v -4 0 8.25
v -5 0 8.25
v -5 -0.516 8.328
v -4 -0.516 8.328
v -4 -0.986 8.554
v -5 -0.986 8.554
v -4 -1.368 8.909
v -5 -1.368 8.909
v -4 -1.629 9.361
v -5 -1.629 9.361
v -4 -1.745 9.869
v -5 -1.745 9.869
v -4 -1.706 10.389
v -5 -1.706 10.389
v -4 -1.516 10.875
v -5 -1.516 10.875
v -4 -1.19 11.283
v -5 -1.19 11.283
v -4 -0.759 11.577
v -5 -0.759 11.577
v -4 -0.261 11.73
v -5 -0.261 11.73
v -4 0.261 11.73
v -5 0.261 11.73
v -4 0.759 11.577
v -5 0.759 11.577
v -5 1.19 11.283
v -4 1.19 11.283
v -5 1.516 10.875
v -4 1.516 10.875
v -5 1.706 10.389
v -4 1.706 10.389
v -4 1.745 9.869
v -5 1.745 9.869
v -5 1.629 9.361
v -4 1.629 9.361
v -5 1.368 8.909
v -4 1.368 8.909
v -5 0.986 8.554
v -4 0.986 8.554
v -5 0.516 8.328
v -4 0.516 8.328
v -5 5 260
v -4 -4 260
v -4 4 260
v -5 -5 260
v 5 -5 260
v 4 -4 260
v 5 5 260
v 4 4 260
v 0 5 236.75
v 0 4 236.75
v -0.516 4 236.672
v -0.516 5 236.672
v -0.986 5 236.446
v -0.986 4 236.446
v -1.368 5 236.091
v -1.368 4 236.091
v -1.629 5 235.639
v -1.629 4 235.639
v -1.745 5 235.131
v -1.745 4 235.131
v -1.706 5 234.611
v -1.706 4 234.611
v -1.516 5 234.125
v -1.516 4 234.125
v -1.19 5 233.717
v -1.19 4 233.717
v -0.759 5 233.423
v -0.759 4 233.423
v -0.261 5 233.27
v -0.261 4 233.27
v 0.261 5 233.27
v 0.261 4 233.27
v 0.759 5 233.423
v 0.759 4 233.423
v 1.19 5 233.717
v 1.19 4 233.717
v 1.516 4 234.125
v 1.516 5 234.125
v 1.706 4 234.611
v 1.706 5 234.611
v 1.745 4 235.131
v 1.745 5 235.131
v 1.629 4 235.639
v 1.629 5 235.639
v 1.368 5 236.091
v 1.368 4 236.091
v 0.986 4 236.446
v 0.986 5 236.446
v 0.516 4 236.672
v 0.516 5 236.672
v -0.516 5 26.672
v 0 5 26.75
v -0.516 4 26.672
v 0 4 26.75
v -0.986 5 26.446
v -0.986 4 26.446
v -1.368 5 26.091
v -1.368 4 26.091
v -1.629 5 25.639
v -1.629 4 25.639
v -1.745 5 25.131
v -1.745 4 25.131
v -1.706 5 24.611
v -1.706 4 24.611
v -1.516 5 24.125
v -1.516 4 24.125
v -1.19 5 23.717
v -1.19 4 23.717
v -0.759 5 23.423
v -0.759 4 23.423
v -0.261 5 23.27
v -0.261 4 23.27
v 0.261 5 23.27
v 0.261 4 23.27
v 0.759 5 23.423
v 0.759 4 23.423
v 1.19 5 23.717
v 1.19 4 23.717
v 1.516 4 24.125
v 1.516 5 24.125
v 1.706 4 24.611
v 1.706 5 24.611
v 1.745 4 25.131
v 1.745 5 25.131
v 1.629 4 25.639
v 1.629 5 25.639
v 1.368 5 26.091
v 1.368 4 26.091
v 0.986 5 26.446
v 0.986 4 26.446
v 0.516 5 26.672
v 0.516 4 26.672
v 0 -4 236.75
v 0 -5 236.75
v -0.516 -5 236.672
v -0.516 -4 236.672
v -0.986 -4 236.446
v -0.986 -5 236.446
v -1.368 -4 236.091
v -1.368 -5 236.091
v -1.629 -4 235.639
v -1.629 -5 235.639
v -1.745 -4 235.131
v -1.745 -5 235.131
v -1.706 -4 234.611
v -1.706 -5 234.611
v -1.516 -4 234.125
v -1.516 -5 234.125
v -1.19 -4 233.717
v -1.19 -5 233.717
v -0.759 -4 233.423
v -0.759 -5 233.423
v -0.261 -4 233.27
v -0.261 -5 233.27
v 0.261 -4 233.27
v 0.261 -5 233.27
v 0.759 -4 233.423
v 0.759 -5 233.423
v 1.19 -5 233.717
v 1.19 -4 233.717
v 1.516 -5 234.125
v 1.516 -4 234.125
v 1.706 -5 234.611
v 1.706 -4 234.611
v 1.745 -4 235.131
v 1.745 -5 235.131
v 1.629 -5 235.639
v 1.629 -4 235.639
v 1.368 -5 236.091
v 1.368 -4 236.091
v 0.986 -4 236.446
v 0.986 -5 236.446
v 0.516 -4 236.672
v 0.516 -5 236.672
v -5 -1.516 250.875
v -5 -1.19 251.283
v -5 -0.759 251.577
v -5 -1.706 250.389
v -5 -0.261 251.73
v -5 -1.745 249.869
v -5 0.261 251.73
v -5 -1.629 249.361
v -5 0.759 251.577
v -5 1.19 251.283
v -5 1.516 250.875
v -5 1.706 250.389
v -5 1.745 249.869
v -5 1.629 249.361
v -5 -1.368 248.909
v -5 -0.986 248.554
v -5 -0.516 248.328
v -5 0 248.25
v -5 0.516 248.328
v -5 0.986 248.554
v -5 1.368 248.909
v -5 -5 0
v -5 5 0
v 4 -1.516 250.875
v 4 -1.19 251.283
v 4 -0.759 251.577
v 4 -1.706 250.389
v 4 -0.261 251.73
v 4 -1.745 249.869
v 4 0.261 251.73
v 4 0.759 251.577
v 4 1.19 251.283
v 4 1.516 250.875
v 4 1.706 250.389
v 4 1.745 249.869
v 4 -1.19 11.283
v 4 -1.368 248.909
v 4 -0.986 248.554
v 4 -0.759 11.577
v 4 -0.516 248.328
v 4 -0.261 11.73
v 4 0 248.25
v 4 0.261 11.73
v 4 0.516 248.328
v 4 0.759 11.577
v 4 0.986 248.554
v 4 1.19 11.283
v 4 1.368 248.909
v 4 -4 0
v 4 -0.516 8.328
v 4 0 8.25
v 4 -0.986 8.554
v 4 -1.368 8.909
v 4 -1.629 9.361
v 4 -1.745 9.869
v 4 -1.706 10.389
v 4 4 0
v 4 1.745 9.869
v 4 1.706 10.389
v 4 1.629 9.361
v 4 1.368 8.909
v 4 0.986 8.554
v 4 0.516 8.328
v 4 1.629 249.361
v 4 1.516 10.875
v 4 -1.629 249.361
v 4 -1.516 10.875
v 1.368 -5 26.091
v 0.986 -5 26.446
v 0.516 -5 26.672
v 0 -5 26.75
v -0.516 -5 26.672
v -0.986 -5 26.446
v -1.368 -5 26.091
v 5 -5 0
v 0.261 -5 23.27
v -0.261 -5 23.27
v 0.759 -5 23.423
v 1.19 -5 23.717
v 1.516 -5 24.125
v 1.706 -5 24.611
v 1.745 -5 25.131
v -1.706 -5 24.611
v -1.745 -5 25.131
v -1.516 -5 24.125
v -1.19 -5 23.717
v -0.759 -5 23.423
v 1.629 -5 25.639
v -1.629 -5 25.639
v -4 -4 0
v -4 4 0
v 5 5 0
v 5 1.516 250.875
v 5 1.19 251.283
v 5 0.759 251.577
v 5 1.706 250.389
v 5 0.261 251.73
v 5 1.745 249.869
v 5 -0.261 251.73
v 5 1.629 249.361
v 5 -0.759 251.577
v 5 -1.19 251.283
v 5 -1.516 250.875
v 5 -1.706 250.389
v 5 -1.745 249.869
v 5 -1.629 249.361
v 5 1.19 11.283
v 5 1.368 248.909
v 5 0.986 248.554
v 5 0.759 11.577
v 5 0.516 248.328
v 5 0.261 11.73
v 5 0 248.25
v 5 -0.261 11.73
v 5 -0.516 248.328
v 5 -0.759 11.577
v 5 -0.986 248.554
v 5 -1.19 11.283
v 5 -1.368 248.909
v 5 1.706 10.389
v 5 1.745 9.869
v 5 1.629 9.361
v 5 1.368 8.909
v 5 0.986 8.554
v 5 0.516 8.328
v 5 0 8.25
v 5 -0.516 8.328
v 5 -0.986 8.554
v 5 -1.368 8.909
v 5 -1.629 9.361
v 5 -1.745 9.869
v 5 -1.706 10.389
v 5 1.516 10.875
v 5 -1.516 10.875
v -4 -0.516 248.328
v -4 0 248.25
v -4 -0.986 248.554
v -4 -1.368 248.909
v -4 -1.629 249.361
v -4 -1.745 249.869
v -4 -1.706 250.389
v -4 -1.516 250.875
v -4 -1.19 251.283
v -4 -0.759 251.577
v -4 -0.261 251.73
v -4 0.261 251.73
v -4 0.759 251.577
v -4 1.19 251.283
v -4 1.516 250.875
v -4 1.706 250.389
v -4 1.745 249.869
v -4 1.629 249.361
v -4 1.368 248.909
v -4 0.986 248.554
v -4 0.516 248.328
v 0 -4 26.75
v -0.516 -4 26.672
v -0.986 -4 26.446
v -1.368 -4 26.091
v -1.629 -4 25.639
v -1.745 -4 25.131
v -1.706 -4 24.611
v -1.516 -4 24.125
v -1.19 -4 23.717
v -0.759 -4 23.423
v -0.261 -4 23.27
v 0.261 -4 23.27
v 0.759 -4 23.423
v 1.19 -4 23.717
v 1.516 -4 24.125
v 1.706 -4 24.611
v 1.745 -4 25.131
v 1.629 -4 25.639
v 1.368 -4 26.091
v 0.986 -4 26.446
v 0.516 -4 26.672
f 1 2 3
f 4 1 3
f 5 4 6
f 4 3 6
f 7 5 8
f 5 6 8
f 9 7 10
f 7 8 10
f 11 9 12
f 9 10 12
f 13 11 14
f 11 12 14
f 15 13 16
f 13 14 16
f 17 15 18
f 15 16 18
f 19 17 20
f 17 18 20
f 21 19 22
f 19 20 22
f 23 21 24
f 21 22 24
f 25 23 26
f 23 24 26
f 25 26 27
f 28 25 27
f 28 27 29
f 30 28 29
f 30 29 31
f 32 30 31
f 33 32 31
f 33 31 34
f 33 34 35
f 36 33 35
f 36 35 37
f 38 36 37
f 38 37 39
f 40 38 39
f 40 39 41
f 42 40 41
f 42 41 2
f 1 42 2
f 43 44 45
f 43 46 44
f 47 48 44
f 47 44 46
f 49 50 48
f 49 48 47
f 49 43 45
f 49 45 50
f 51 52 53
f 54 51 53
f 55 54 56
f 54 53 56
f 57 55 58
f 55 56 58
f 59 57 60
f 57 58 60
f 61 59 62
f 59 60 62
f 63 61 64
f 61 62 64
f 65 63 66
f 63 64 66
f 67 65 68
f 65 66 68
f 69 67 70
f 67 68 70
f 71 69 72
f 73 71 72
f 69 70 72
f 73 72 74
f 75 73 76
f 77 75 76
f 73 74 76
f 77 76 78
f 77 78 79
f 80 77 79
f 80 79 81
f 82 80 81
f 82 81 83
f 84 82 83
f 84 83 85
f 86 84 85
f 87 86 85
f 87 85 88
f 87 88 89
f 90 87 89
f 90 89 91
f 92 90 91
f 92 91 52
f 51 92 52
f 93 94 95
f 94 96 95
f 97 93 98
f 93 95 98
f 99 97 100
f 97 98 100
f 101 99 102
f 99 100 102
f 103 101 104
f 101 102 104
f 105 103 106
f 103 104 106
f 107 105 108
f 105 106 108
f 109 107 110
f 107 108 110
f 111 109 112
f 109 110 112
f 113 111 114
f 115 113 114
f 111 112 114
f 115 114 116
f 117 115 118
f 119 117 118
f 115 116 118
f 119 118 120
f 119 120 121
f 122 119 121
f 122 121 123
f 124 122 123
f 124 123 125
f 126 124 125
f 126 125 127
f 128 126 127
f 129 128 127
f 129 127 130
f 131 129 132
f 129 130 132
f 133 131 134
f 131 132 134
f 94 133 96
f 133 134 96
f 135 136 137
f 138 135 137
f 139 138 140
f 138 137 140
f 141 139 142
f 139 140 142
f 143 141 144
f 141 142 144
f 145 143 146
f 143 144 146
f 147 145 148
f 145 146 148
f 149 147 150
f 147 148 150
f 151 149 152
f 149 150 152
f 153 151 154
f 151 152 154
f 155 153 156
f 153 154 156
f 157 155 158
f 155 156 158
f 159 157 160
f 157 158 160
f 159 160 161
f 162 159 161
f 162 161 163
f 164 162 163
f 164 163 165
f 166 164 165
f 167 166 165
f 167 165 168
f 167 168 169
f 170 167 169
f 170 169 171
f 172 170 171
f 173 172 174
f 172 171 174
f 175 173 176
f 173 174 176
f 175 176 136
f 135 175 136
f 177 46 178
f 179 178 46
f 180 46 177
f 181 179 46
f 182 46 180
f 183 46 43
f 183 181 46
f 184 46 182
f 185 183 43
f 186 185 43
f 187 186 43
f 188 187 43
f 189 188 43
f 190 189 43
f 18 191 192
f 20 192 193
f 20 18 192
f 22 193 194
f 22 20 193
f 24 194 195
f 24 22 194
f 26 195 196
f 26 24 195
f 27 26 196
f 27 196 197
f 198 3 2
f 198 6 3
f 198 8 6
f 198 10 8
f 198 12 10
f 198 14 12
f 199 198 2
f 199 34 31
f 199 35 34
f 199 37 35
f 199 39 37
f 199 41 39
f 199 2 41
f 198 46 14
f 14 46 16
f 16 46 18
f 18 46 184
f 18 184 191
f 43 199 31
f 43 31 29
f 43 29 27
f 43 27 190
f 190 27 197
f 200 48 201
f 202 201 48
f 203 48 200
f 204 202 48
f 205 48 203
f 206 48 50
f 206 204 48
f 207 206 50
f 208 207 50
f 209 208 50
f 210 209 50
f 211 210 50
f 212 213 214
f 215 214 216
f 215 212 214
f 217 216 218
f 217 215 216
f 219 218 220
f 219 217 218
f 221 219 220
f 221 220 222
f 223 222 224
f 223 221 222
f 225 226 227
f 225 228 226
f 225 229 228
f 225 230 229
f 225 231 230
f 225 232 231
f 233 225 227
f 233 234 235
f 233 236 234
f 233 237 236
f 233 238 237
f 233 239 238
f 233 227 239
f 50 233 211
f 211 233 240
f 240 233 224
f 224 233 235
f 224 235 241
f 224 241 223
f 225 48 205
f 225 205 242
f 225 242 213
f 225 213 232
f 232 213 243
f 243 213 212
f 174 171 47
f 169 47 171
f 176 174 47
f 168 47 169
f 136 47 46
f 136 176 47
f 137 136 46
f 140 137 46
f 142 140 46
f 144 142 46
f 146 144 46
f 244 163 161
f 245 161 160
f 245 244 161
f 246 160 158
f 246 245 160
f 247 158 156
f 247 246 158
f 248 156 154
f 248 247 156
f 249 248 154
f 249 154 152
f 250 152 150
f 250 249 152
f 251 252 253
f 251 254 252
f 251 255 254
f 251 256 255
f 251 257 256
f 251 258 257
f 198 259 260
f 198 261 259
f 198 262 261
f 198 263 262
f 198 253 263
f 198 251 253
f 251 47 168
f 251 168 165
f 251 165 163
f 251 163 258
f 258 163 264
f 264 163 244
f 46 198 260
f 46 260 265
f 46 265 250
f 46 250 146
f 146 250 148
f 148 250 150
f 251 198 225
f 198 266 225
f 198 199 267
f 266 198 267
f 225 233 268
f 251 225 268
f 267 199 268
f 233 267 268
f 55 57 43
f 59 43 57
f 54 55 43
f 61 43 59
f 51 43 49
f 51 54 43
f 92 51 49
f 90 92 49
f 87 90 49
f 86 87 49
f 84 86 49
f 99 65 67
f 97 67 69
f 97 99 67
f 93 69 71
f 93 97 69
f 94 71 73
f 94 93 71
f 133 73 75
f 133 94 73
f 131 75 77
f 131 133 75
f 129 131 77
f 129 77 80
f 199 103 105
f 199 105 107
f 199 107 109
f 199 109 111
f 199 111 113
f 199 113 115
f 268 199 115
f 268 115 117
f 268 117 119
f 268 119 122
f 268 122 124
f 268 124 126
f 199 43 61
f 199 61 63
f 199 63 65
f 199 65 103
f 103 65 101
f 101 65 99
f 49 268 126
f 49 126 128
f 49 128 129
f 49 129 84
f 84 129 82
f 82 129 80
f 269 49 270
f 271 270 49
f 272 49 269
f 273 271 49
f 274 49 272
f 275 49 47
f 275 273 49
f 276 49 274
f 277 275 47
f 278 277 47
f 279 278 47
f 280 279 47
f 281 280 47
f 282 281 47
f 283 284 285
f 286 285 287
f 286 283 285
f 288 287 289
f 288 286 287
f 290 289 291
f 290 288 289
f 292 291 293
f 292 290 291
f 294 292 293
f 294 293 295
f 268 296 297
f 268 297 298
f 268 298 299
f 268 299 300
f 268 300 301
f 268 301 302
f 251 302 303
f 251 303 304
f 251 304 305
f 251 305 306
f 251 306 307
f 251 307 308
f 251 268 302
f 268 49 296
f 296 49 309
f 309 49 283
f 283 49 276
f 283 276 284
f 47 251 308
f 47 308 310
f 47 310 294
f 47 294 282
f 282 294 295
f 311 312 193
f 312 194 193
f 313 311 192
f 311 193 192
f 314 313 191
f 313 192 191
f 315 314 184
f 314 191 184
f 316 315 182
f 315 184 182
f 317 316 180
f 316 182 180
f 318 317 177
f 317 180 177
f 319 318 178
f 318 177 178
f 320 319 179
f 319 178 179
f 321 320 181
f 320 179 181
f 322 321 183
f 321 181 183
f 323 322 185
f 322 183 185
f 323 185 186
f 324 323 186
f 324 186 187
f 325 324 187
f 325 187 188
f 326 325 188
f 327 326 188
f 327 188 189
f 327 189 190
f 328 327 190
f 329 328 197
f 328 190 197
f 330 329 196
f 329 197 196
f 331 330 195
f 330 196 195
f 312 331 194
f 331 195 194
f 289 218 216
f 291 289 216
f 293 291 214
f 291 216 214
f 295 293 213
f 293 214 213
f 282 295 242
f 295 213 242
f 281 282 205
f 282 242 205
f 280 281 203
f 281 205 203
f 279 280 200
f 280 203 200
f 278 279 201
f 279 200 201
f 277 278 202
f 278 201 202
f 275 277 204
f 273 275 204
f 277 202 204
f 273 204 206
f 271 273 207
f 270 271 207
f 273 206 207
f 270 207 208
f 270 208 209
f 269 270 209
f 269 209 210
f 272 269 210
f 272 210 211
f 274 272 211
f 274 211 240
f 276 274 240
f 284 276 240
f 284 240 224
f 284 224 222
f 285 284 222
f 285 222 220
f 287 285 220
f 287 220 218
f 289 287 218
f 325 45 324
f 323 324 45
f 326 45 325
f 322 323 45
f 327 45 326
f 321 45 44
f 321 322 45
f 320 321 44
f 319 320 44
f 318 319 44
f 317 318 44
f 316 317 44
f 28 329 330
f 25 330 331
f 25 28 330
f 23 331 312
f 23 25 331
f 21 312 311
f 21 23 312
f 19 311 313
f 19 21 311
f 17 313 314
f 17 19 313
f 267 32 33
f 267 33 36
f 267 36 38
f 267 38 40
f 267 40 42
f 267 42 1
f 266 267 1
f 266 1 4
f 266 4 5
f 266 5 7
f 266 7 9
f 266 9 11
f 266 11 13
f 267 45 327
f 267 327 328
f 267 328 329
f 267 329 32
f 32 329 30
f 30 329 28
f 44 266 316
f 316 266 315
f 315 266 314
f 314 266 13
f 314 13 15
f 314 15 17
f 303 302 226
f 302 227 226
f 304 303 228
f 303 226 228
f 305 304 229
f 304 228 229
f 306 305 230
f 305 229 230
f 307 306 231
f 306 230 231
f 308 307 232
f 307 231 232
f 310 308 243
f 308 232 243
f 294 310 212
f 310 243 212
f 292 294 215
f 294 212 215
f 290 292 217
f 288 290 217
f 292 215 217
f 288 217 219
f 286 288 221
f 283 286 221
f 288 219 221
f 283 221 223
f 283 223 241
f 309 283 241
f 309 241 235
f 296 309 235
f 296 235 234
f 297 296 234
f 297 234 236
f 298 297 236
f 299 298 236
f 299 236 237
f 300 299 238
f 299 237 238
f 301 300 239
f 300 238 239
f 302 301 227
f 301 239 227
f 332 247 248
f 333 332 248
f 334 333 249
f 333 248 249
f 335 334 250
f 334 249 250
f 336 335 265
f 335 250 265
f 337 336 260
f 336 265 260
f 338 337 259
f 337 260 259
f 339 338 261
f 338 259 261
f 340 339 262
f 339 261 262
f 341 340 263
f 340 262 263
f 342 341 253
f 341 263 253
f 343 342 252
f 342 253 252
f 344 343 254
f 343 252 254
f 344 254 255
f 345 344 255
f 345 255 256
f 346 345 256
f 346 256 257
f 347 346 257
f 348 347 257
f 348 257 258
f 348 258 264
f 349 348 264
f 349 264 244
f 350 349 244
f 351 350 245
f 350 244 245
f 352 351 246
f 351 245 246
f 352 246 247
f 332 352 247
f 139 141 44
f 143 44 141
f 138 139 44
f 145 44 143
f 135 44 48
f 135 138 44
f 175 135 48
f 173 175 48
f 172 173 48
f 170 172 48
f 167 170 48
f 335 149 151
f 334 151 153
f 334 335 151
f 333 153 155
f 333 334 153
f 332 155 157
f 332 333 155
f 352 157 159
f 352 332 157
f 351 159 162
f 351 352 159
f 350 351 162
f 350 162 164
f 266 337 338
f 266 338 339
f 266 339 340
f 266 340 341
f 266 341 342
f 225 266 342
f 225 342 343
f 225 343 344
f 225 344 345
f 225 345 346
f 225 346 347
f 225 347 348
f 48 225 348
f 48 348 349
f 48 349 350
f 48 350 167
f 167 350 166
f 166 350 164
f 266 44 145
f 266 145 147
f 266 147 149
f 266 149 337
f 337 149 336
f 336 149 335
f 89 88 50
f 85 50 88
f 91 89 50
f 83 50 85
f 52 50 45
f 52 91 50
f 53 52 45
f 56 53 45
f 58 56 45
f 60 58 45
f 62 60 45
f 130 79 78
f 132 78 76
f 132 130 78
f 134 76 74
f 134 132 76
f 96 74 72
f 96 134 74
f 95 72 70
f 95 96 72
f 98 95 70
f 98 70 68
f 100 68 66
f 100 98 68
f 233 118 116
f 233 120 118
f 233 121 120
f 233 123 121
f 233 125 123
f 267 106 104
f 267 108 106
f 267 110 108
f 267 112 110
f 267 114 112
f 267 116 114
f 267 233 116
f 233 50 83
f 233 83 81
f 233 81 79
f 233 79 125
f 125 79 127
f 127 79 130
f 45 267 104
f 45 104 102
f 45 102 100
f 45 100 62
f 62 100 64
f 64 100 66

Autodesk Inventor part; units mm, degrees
ref_plane "YZ Plane" through (0, 0, 0) normal (1, 0, 0) x (0, 1, 0)
ref_plane "XZ Plane" through (0, 0, 0) normal (0, 1, 0) x (-1, 0, 0)
ref_plane "XY Plane" through (0, 0, 0) normal (0, 0, 1) x (1, 0, 0)
sketch "スケッチ1" plane through (0, 0, 0) normal (0, 0, 1) x (1, 0, 0)
  line L0 (5, -5) -> (-5, -5)
  line L1 (-5, -5) -> (-5, 5)
  line L2 (-5, 5) -> (5, 5)
  line L3 (5, 5) -> (5, -5)
  line L4 (5, -5) -> (-5, 5) construction
  line L5 (-5, -5) -> (5, 5) construction
  line L6 (4, 4) -> (-4, 4)
  line L7 (-4, 4) -> (-4, -4)
  line L8 (-4, -4) -> (4, -4)
  line L9 (4, -4) -> (4, 4)
  point P0 (0, 0)
  dimension "d0" = 10
  dimension "d1" = 10
  dimension "d2" = 1
extrude "押し出し1" add sketch "スケッチ1" along normal blind 260
sketch "スケッチ2" plane through (5, -5, 0) normal (1, 0, 0) x (0, 0, -1)
  line L0 (0, 5) -> (-228.6606, 5)
  line L1 (0, 0) -> (0, 10) projected
  point P0 (-250, 5)
  point P1 (-10, 5)
  dimension "d5" = 240
  dimension "d6" = 10
hole "穴1" at (5, 0, 250) at (5, 0, 10) direction (-1, 0, 0) diameter 3.5 end through all
sketch "スケッチ3" plane through (-5, 5, 0) normal (0, 1, 0) x (1, 0, 0)
  line L0 (5, 0) -> (5, -260)
  line L1 (9, -260) -> (1, -260) projected
  line L2 (10, 0) -> (0, 0) projected
  point P0 (5, -235)
  point P1 (5, -25)
  dimension "d14" = 25
  dimension "d23" = 25
hole "穴2" at (0, 5, 235) at (0, 5, 25) direction (0, -1, 0) diameter 3.5 end through all
equation "\"d23\" = d14"
properties part number "small_kaku_1010_bridge_1020"
